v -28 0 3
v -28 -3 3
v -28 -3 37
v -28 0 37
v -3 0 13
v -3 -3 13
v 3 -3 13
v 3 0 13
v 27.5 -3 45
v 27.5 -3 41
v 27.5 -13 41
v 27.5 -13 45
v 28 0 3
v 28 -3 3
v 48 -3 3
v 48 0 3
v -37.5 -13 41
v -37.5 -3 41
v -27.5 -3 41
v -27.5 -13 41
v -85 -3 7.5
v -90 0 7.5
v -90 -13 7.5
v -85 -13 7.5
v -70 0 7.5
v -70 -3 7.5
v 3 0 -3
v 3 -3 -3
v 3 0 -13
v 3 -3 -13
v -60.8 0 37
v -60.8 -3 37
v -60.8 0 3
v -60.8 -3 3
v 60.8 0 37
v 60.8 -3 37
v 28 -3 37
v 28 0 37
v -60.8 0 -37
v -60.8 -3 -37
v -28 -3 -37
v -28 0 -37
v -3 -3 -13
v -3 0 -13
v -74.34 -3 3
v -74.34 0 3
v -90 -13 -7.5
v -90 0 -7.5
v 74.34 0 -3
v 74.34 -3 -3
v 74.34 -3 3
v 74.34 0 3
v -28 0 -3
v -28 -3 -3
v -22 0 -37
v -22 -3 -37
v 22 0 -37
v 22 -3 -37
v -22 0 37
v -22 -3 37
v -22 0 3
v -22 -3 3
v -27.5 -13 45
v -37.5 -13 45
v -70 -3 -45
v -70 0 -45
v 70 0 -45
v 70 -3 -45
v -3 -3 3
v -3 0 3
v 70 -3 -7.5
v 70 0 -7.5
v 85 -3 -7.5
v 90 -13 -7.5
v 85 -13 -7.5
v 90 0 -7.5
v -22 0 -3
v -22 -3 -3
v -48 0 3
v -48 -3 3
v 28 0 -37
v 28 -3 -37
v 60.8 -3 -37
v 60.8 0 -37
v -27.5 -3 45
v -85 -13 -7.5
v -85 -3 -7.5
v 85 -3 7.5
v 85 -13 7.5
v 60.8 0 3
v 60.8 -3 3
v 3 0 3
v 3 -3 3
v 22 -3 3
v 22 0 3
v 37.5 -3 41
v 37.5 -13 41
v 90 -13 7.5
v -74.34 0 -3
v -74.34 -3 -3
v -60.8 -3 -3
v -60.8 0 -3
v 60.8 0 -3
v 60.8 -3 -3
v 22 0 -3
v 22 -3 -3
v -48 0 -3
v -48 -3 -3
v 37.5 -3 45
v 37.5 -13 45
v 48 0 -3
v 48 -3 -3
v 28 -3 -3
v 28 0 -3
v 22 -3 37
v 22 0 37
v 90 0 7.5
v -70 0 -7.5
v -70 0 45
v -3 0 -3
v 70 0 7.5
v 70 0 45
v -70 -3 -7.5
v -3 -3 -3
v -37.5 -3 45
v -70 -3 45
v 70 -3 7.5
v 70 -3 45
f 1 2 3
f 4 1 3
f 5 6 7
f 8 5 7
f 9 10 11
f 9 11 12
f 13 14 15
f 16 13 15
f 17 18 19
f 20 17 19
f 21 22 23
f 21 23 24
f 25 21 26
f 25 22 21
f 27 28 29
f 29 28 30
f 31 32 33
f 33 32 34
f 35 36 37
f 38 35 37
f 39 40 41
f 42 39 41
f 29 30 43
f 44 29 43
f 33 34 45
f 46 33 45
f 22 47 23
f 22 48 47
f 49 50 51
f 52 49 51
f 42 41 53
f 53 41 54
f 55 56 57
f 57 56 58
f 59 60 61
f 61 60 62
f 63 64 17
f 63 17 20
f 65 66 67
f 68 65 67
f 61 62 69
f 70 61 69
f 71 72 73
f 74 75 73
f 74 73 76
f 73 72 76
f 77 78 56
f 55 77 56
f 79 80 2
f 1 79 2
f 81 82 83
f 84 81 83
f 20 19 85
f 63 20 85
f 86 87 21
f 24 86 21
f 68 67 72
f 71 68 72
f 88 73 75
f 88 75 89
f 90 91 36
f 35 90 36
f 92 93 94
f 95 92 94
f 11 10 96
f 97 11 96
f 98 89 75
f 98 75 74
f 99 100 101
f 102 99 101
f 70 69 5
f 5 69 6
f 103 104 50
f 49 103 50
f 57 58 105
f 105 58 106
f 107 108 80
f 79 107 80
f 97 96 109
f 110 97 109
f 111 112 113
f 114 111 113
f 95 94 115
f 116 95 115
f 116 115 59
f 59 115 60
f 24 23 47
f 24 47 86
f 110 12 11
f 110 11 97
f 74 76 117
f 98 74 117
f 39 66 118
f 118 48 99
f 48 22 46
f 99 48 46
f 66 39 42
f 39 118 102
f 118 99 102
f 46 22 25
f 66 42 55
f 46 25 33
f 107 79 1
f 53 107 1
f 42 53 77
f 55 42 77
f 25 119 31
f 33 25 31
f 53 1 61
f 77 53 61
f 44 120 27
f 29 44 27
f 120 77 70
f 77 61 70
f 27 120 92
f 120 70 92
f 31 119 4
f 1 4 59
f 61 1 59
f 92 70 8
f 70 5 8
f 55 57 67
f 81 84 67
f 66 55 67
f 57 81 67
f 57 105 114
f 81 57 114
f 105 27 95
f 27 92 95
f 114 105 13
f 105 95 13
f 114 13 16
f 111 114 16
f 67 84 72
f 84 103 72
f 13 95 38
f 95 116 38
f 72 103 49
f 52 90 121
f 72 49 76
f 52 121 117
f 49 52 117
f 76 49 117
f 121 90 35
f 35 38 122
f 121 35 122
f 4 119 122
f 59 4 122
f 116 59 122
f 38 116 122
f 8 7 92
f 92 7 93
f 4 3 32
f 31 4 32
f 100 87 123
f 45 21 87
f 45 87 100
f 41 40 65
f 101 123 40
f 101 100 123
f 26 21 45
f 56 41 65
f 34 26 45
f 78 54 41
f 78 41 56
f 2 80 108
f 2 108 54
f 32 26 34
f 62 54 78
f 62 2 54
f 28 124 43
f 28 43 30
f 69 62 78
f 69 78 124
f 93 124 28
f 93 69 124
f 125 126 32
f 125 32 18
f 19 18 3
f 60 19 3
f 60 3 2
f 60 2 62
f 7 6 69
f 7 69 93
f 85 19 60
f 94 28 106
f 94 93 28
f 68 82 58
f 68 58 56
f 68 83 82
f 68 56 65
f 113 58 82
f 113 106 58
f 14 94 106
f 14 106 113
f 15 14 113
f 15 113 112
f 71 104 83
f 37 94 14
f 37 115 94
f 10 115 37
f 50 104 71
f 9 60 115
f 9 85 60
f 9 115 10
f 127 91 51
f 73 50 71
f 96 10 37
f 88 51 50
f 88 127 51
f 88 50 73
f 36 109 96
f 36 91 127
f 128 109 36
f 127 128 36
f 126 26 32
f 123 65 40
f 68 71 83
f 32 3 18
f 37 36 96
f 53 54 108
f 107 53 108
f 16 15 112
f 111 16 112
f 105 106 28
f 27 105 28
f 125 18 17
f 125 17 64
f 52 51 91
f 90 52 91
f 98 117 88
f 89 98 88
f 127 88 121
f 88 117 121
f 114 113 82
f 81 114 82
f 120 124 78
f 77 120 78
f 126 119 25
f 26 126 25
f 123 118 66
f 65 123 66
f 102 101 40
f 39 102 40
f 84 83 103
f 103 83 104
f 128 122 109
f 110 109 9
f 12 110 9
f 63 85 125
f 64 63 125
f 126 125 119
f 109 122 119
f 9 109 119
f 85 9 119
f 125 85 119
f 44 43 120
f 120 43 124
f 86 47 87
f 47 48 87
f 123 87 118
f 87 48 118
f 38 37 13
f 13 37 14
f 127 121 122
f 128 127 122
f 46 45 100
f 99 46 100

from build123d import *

# Parameters (mm, degrees)
F1_DEPTH = 3
F3_DEPTH = 25
F4_W     = 5
F4_H     = 15
F4_W_2   = 10
F4_H_2   = 4
F5_DEPTH = 10


with BuildPart() as f1:
    # F0 (on Front) → F1 (new body)
    with BuildSketch(Plane.XZ):
        Polygon((70, 45), (-70, 45), (-70, 7.5), (-90, 7.5), (-90, -7.5), (-70, -7.5), (-70, -45), (70, -45), (70, -7.5), (90, -7.5), (90, 7.5), (70, 7.5), align=None)
    extrude(amount=F1_DEPTH)

    # F2 (on face) → F3 (cut)
    with BuildSketch(Plane.XZ.offset(3)):
        Polygon((-28, 37), (-60.8, 37), (-60.8, 3), (-74.339576, 3), (-74.339576, -3), (-60.8, -3), (-60.8, -37), (-28, -37), (-28, -3), (-48, -3), (-48, 3), (-28, 3), align=None)
        Polygon((0, 37), (-22, 37), (-22, 3), (-3, 3), (-3, 13), (0, 13), (3, 13), (3, 3), (22, 3), (22, 37), align=None)
        Polygon((-3, -13), (-3, -3), (-22, -3), (-22, -37), (0, -37), (22, -37), (22, -3), (3, -3), (3, -13), (0, -13), align=None)
        Polygon((60.8, 3), (60.8, 37), (28, 37), (28, 3), (48, 3), (48, -3), (28, -3), (28, -37), (60.8, -37), (60.8, -3), (74.339576, -3), (74.339576, 3), align=None)
    extrude(amount=-F3_DEPTH, mode=Mode.SUBTRACT)

    # F4 (on face) → F5 (join)
    with BuildSketch(Plane.XZ.offset(3)):
        with Locations((-87.5, 0)):
            Rectangle(F4_W, F4_H)
        with Locations((87.5, 0)):
            Rectangle(F4_W, F4_H)
        with Locations((-32.5, 43)):
            Rectangle(F4_W_2, F4_H_2)
        with Locations((32.5, 43)):
            Rectangle(F4_W_2, F4_H_2)
    extrude(amount=F5_DEPTH)


solid = f1.part
